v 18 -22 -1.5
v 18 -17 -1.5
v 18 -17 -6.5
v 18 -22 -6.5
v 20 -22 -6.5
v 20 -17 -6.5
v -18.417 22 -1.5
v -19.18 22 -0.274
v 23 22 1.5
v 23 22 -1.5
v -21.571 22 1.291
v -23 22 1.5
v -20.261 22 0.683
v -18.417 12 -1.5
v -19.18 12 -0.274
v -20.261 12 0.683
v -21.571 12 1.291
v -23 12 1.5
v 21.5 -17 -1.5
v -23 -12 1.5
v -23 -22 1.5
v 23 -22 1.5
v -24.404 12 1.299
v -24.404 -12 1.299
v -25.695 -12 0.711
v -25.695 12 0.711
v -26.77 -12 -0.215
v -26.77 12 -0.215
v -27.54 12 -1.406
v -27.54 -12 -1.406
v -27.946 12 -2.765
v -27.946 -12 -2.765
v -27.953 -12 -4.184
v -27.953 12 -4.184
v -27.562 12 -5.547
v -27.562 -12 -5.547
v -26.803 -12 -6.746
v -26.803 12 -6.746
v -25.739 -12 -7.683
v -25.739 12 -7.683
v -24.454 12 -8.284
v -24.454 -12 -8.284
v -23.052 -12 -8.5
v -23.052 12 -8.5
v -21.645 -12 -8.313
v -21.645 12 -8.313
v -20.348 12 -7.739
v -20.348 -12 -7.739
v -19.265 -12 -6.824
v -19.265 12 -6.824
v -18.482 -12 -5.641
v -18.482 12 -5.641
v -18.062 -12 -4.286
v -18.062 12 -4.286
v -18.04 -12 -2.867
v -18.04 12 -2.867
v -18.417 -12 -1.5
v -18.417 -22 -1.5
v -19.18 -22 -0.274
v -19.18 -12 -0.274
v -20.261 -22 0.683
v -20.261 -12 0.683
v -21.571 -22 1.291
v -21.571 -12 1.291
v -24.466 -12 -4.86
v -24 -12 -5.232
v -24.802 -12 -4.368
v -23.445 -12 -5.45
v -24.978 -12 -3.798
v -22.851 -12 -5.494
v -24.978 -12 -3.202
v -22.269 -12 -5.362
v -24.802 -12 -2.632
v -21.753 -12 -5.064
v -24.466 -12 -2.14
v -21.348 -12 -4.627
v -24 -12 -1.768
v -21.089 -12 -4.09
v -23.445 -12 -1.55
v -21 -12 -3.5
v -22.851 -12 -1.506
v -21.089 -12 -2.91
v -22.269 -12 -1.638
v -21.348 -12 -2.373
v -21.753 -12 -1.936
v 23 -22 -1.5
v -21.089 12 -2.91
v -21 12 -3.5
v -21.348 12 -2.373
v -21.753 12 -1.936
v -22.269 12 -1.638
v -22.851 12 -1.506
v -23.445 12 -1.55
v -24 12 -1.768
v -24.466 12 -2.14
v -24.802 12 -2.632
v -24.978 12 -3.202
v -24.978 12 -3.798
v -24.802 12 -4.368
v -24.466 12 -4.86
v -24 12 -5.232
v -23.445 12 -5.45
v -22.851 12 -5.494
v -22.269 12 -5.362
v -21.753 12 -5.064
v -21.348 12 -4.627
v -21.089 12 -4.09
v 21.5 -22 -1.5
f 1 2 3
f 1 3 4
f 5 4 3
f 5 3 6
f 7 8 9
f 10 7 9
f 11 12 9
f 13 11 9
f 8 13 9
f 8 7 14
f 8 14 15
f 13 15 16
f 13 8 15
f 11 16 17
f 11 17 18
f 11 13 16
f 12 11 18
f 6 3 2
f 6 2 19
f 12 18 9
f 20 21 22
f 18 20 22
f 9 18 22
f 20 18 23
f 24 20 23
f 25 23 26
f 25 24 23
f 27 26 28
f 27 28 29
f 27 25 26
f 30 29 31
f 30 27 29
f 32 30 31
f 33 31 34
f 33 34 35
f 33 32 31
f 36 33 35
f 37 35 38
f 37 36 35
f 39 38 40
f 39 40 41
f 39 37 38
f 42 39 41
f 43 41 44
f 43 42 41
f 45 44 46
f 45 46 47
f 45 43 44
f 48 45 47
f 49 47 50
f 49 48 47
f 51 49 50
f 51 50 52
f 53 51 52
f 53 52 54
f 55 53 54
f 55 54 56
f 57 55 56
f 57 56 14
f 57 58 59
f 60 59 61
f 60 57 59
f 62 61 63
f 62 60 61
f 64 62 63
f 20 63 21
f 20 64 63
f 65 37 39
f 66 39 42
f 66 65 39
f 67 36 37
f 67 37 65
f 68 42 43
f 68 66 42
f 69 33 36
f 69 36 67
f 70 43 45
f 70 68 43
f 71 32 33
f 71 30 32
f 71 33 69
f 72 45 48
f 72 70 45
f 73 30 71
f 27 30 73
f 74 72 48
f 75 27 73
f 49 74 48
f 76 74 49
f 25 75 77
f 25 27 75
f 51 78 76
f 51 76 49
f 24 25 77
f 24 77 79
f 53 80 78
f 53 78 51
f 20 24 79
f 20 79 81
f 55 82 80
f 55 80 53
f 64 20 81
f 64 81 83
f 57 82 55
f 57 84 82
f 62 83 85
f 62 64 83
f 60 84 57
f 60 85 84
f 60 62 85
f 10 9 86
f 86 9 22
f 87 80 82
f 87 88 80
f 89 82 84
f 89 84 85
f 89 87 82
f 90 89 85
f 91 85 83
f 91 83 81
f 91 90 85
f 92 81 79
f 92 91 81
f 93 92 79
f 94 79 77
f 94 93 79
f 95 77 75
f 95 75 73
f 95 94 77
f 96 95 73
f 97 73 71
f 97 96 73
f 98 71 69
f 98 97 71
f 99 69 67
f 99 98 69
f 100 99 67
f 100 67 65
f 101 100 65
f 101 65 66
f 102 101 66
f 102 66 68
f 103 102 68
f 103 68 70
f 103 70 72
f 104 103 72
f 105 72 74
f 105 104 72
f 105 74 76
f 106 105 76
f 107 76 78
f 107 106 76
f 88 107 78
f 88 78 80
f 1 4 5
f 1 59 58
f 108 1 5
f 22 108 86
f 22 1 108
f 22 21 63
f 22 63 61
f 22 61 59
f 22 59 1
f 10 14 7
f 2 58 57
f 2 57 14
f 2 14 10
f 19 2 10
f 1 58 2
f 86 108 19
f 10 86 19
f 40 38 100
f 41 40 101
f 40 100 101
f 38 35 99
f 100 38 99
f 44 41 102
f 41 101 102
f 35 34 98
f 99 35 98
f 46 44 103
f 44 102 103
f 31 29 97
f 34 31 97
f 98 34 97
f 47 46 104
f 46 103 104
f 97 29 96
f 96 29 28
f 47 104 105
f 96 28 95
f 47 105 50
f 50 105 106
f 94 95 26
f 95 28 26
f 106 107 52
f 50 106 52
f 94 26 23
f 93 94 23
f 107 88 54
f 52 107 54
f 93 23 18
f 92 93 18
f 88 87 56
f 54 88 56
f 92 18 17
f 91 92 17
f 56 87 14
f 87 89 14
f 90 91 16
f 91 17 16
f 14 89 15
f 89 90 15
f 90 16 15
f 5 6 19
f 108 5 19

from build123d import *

# Parameters (mm, degrees)
F0_W          = 46
F0_H          = 3
F1_DEPTH      = 22
F2_R          = 5
F2_R_2        = 2
F3_DEPTH      = 22.001
F3_DEPTH_BACK = 22.001
F4_DEPTH      = 12
F5_W          = 5
F5_H          = 5
F6_DEPTH      = 5
F8_DEPTH      = 5.001


with BuildPart() as f1:
    # F0 (on Front) → F1 (new body, symmetric)
    with BuildSketch(Plane.XZ):
        Rectangle(F0_W, F0_H)
    extrude(amount=F1_DEPTH, both=True)

    # F2 (on Front) → F3 (cut, two sides)
    with BuildSketch(Plane.XZ) as f3_sk:
        with Locations((-23, -3.5)):
            Circle(F2_R)
        with Locations((-23, -3.5)):
            Circle(F2_R_2, mode=Mode.SUBTRACT)
    extrude(amount=F3_DEPTH, mode=Mode.SUBTRACT)
    extrude(f3_sk.sketch, amount=-F3_DEPTH_BACK, mode=Mode.SUBTRACT)

    # F2 (on Front) → F4 (join, symmetric)
    with BuildSketch(Plane.XZ):
        with Locations((-23, -3.5)):
            Circle(F2_R)
        with Locations((-23, -3.5)):
            Circle(F2_R_2, mode=Mode.SUBTRACT)
    extrude(amount=F4_DEPTH, both=True)

    # F5 (on face) → F6 (join)
    with BuildSketch(Plane(origin=(0, 0, -1.5), x_dir=(1, 0, 0), z_dir=(0, 0, -1))):
        with Locations((20.5, 19.5)):
            Rectangle(F5_W, F5_H)
    extrude(amount=F6_DEPTH)

    # F7 (on face) → F8 (cut, through all)
    with BuildSketch(Plane(origin=(0, -17, 0), x_dir=(-1, 0, 0), z_dir=(0, 1, 0))):
        Polygon((-23, -1.5), (-23, -6.5), (-20, -6.5), (-21.5, -1.5), align=None)
    extrude(amount=-F8_DEPTH, mode=Mode.SUBTRACT)


solid = f1.part
